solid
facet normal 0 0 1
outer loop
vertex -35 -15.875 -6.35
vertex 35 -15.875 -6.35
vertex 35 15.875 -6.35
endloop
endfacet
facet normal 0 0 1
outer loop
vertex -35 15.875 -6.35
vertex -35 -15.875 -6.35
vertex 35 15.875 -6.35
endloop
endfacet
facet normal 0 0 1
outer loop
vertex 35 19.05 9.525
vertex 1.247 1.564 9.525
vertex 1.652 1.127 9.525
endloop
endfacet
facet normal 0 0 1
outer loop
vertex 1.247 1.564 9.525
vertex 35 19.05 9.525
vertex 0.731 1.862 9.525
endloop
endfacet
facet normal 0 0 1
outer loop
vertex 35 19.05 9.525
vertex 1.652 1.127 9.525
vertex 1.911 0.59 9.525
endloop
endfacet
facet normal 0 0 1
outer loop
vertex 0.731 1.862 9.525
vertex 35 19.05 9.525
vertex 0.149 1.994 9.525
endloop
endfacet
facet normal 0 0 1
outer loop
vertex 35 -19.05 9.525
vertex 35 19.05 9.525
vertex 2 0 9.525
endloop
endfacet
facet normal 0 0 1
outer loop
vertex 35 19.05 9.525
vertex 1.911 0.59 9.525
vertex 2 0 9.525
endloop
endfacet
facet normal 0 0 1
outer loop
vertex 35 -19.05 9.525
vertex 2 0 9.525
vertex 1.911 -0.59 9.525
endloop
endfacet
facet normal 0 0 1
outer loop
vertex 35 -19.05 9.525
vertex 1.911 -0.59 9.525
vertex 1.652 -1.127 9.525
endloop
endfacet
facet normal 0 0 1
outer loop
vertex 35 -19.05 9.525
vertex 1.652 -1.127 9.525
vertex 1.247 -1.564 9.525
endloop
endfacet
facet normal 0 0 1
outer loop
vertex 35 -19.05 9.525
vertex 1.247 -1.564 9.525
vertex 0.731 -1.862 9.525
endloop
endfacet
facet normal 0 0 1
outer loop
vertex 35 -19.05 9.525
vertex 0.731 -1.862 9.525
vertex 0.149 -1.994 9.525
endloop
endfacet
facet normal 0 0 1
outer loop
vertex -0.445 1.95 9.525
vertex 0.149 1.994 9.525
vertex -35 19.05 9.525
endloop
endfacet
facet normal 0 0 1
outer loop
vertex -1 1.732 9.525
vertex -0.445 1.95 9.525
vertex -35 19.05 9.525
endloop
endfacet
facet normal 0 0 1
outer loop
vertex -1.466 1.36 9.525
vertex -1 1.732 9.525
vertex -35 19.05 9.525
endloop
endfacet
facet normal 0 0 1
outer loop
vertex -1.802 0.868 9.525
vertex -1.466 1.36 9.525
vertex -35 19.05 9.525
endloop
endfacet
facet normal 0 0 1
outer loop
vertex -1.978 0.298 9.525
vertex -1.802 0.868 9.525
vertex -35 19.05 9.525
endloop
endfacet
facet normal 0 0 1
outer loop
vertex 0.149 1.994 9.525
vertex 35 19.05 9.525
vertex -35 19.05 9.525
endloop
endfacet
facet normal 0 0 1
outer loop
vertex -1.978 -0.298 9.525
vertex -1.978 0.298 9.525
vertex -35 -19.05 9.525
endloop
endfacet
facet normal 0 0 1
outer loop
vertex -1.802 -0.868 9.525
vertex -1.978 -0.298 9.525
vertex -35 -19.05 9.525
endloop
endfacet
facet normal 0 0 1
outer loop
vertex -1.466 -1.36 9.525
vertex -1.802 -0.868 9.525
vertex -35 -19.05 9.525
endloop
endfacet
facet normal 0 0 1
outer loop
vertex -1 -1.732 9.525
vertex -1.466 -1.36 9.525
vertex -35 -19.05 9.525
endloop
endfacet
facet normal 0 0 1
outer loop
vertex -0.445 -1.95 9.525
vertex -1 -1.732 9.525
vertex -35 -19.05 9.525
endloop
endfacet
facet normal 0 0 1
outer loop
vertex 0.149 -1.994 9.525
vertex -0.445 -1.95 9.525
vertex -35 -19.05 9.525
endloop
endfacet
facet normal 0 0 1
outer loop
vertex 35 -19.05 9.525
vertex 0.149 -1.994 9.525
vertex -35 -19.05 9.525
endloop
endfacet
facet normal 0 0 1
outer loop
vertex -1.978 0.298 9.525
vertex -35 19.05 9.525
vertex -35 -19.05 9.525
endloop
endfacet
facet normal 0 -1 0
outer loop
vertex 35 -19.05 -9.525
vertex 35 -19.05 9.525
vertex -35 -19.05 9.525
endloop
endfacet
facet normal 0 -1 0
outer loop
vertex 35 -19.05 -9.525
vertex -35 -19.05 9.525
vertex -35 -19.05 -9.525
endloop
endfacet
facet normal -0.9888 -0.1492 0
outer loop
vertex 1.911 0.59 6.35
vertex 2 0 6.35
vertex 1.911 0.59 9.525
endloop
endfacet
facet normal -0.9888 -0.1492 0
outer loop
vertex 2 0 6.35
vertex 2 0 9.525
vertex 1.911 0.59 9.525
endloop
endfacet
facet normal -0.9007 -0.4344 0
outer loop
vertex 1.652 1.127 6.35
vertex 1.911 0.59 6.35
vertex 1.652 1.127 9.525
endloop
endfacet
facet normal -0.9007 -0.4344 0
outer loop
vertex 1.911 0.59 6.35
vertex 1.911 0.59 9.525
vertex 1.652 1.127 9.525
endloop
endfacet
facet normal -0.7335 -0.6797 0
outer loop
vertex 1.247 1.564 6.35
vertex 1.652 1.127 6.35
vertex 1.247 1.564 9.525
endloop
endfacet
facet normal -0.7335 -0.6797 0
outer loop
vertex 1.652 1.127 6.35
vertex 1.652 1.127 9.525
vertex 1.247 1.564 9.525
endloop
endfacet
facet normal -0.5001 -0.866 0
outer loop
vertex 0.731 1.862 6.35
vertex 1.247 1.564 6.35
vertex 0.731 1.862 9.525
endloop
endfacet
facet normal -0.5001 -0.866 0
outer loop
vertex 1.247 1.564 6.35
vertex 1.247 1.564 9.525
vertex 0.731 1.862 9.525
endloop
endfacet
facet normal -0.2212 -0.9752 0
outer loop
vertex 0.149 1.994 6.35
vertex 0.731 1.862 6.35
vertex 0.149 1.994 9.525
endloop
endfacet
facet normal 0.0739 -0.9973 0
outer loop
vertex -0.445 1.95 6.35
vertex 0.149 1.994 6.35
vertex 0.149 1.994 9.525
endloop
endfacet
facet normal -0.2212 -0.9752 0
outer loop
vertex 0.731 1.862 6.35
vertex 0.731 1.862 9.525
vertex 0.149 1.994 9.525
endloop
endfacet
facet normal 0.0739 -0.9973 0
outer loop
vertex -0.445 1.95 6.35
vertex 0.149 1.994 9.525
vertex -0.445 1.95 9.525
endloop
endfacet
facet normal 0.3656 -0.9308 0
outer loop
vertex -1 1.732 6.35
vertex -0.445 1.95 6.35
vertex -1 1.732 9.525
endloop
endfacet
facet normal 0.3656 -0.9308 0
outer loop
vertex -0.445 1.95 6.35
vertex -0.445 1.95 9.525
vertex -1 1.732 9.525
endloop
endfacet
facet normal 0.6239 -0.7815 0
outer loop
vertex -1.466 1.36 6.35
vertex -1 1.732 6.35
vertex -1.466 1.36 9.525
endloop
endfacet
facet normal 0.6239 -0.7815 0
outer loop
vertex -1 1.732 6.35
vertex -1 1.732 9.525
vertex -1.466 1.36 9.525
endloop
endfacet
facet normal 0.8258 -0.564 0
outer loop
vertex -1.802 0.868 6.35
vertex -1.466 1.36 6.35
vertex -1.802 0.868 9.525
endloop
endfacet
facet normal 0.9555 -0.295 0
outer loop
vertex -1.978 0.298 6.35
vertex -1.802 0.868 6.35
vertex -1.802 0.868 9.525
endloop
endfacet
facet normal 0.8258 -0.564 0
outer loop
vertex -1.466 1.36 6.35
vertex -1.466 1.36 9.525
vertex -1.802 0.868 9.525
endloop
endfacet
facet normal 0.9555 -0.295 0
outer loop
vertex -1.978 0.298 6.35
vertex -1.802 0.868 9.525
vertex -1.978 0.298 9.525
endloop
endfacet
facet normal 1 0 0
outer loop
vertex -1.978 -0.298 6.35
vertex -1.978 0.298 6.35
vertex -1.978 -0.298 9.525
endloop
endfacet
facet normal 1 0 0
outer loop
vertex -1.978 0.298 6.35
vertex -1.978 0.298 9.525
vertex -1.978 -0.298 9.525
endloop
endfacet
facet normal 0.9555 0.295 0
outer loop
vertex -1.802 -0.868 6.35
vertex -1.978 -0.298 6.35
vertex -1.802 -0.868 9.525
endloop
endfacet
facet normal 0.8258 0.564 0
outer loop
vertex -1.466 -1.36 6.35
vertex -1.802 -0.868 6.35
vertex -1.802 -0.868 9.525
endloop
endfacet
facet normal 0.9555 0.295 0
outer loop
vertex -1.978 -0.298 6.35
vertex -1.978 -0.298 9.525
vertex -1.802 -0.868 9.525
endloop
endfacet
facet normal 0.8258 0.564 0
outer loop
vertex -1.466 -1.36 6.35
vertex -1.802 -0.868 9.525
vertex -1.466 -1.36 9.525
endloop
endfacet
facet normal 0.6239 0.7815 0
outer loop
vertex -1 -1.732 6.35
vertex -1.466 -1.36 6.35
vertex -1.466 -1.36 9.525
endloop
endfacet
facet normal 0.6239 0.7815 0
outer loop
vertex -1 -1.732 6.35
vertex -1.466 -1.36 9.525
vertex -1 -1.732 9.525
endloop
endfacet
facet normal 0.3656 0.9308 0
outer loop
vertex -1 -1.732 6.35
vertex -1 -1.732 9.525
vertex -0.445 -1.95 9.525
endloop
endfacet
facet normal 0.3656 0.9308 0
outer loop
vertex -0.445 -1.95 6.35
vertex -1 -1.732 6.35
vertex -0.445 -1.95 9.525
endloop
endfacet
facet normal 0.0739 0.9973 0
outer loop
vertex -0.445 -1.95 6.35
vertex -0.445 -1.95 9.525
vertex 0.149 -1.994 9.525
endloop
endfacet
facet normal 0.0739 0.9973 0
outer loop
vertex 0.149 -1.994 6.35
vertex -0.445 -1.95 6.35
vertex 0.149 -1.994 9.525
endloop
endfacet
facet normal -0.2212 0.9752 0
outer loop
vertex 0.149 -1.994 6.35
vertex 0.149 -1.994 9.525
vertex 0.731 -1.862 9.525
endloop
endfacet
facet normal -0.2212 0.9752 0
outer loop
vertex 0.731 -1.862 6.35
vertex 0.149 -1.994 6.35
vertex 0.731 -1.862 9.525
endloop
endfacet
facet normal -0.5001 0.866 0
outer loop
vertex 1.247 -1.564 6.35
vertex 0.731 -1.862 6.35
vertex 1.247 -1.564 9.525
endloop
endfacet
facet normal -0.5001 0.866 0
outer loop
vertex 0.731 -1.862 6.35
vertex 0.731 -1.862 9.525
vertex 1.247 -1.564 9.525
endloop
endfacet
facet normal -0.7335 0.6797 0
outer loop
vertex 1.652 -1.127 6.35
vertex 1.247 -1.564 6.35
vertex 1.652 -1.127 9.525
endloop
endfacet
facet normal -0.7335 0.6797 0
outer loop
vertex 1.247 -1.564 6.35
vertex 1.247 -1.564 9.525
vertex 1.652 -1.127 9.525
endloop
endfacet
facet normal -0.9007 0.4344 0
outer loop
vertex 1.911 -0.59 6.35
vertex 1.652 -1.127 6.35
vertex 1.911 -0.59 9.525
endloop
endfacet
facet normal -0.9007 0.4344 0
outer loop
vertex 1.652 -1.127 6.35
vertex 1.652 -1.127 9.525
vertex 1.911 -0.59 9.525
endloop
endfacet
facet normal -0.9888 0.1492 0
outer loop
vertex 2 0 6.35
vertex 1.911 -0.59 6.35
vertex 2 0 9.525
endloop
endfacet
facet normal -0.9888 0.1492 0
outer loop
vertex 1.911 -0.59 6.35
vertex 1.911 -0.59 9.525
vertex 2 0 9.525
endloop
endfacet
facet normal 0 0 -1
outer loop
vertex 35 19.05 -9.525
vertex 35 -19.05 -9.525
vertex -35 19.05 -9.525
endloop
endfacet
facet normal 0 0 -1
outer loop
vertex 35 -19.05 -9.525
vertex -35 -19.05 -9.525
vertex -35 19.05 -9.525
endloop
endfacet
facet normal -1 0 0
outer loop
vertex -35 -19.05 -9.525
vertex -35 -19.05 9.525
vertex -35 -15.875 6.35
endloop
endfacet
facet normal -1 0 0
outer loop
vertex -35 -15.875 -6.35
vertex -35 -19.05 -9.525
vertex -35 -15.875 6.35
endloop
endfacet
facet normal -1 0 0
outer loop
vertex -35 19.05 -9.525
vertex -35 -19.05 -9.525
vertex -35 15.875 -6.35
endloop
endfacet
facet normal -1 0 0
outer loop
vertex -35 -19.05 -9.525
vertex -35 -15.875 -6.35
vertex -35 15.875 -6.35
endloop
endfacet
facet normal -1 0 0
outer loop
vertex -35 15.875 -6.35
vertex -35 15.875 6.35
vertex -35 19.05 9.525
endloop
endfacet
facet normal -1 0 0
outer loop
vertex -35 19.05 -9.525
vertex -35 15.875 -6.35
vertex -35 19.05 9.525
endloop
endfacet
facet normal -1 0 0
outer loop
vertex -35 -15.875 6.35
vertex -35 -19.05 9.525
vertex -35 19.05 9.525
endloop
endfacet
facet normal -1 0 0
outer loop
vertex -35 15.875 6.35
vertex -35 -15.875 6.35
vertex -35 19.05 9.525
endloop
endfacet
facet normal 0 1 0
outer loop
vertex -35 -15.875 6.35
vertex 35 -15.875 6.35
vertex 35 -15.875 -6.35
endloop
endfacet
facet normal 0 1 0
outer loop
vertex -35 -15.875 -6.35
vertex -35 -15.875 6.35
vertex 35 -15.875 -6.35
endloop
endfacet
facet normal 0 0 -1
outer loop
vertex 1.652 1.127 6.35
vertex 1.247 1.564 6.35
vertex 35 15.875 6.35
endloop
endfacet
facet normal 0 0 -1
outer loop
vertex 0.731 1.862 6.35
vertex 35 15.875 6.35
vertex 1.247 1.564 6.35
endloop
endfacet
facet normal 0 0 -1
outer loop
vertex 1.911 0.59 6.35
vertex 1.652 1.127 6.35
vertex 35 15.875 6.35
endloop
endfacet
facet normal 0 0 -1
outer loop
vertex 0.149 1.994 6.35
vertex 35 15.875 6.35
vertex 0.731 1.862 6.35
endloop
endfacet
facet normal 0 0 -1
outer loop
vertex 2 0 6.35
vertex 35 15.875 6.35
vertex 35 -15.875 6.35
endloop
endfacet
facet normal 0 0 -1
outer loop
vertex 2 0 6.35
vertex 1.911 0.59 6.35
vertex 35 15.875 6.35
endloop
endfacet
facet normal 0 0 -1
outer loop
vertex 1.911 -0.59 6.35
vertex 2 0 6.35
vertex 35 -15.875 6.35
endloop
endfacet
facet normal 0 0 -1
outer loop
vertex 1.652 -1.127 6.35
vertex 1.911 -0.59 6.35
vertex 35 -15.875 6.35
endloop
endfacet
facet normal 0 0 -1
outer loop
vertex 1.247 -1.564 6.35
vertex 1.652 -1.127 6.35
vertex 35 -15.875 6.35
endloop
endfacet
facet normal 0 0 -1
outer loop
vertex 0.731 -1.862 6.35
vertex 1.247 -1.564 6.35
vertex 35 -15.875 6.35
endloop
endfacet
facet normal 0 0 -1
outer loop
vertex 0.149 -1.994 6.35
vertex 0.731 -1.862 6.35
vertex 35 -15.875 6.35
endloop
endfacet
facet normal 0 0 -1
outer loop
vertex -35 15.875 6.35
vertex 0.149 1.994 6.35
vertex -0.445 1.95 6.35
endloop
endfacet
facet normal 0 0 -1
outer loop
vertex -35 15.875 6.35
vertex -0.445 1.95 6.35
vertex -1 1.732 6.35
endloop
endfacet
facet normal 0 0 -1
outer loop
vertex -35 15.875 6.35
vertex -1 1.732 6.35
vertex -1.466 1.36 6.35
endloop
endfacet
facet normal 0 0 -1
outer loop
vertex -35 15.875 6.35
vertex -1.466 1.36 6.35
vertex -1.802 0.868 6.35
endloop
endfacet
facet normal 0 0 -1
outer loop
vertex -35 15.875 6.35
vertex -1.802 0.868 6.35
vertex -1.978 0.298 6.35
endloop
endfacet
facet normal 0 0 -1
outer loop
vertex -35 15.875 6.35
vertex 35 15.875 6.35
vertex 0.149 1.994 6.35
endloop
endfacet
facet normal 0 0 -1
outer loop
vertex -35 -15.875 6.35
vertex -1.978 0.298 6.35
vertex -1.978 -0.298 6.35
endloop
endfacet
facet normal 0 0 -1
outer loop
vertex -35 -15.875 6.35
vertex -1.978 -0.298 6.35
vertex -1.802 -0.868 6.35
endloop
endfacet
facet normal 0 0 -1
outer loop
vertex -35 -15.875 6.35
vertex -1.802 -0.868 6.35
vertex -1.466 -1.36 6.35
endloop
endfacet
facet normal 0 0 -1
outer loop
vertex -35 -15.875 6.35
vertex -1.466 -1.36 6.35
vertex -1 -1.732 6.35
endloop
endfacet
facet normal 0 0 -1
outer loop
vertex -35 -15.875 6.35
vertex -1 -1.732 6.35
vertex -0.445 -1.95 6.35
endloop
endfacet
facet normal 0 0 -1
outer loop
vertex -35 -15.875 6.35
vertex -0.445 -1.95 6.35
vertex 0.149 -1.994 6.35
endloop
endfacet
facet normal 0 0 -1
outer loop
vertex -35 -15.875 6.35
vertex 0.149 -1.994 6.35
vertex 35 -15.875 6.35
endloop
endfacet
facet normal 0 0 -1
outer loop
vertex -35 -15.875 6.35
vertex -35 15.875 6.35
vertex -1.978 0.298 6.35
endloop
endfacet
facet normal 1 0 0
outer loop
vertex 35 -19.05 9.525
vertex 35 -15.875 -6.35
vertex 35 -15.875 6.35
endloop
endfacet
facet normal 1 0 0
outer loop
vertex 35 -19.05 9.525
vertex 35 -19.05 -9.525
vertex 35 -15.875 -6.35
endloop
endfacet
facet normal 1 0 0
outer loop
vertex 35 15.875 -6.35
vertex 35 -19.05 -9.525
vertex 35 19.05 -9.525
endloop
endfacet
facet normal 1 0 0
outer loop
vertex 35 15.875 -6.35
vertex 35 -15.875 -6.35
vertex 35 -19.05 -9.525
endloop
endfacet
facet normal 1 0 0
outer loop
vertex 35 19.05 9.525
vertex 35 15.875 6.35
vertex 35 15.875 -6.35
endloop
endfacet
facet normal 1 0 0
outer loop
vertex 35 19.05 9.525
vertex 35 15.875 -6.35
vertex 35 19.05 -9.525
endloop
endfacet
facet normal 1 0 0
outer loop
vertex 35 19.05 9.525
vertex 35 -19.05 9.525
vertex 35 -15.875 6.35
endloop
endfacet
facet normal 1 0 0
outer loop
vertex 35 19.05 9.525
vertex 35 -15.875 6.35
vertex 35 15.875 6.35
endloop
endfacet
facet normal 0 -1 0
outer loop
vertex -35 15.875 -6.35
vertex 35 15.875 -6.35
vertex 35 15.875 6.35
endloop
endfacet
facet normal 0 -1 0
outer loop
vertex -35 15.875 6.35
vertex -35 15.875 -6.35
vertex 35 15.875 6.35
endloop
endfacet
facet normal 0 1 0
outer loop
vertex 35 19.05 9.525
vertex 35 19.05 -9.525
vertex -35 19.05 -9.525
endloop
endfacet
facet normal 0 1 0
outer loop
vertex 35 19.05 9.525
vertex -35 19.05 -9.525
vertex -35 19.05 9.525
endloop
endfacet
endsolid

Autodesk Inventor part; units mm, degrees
ref_plane "YZ Plane" through (0, 0, 0) normal (1, 0, 0) x (0, 1, 0)
ref_plane "XZ Plane" through (0, 0, 0) normal (0, 1, 0) x (-1, 0, 0)
ref_plane "XY Plane" through (0, 0, 0) normal (0, 0, 1) x (1, 0, 0)
sketch "Sketch1" plane through (0, 0, 0) normal (1, 0, 0) x (0, 1, 0)
  line L0 (-15.875, -6.35) -> (15.875, -6.35)
  line L1 (15.875, -6.35) -> (15.875, 6.35)
  line L2 (15.875, 6.35) -> (-15.875, 6.35)
  line L3 (-15.875, 6.35) -> (-15.875, -6.35)
  line L4 (-15.875, -6.35) -> (15.875, 6.35) construction
  line L5 (15.875, -6.35) -> (-15.875, 6.35) construction
  line L6 (-19.05, -9.525) -> (19.05, -9.525)
  line L7 (19.05, -9.525) -> (19.05, 9.525)
  line L8 (19.05, 9.525) -> (-19.05, 9.525)
  line L9 (-19.05, 9.525) -> (-19.05, -9.525)
  line L10 (-19.05, -9.525) -> (19.05, 9.525) construction
  line L11 (19.05, -9.525) -> (-19.05, 9.525) construction
  point P0 (0, 0)
  dimension "d0" = 38.1
  dimension "d1" = 19.05
  dimension "d2" = 3.175
  dimension "d3" = 3.175
extrude "Extrusion1" add sketch "Sketch1" along normal mid plane 70
sketch "Sketch2" plane through (-35, -19.05, 9.525) normal (0, 0, 1) x (1, 0, 0)
  circle A0 centre (35, 19.05) radius 2
  dimension "d6" = 4
extrude "Extrusion2" cut sketch "Sketch2" against normal blind 10
equation "\"d3\" = d2"
properties part number "AluminumBlock"
